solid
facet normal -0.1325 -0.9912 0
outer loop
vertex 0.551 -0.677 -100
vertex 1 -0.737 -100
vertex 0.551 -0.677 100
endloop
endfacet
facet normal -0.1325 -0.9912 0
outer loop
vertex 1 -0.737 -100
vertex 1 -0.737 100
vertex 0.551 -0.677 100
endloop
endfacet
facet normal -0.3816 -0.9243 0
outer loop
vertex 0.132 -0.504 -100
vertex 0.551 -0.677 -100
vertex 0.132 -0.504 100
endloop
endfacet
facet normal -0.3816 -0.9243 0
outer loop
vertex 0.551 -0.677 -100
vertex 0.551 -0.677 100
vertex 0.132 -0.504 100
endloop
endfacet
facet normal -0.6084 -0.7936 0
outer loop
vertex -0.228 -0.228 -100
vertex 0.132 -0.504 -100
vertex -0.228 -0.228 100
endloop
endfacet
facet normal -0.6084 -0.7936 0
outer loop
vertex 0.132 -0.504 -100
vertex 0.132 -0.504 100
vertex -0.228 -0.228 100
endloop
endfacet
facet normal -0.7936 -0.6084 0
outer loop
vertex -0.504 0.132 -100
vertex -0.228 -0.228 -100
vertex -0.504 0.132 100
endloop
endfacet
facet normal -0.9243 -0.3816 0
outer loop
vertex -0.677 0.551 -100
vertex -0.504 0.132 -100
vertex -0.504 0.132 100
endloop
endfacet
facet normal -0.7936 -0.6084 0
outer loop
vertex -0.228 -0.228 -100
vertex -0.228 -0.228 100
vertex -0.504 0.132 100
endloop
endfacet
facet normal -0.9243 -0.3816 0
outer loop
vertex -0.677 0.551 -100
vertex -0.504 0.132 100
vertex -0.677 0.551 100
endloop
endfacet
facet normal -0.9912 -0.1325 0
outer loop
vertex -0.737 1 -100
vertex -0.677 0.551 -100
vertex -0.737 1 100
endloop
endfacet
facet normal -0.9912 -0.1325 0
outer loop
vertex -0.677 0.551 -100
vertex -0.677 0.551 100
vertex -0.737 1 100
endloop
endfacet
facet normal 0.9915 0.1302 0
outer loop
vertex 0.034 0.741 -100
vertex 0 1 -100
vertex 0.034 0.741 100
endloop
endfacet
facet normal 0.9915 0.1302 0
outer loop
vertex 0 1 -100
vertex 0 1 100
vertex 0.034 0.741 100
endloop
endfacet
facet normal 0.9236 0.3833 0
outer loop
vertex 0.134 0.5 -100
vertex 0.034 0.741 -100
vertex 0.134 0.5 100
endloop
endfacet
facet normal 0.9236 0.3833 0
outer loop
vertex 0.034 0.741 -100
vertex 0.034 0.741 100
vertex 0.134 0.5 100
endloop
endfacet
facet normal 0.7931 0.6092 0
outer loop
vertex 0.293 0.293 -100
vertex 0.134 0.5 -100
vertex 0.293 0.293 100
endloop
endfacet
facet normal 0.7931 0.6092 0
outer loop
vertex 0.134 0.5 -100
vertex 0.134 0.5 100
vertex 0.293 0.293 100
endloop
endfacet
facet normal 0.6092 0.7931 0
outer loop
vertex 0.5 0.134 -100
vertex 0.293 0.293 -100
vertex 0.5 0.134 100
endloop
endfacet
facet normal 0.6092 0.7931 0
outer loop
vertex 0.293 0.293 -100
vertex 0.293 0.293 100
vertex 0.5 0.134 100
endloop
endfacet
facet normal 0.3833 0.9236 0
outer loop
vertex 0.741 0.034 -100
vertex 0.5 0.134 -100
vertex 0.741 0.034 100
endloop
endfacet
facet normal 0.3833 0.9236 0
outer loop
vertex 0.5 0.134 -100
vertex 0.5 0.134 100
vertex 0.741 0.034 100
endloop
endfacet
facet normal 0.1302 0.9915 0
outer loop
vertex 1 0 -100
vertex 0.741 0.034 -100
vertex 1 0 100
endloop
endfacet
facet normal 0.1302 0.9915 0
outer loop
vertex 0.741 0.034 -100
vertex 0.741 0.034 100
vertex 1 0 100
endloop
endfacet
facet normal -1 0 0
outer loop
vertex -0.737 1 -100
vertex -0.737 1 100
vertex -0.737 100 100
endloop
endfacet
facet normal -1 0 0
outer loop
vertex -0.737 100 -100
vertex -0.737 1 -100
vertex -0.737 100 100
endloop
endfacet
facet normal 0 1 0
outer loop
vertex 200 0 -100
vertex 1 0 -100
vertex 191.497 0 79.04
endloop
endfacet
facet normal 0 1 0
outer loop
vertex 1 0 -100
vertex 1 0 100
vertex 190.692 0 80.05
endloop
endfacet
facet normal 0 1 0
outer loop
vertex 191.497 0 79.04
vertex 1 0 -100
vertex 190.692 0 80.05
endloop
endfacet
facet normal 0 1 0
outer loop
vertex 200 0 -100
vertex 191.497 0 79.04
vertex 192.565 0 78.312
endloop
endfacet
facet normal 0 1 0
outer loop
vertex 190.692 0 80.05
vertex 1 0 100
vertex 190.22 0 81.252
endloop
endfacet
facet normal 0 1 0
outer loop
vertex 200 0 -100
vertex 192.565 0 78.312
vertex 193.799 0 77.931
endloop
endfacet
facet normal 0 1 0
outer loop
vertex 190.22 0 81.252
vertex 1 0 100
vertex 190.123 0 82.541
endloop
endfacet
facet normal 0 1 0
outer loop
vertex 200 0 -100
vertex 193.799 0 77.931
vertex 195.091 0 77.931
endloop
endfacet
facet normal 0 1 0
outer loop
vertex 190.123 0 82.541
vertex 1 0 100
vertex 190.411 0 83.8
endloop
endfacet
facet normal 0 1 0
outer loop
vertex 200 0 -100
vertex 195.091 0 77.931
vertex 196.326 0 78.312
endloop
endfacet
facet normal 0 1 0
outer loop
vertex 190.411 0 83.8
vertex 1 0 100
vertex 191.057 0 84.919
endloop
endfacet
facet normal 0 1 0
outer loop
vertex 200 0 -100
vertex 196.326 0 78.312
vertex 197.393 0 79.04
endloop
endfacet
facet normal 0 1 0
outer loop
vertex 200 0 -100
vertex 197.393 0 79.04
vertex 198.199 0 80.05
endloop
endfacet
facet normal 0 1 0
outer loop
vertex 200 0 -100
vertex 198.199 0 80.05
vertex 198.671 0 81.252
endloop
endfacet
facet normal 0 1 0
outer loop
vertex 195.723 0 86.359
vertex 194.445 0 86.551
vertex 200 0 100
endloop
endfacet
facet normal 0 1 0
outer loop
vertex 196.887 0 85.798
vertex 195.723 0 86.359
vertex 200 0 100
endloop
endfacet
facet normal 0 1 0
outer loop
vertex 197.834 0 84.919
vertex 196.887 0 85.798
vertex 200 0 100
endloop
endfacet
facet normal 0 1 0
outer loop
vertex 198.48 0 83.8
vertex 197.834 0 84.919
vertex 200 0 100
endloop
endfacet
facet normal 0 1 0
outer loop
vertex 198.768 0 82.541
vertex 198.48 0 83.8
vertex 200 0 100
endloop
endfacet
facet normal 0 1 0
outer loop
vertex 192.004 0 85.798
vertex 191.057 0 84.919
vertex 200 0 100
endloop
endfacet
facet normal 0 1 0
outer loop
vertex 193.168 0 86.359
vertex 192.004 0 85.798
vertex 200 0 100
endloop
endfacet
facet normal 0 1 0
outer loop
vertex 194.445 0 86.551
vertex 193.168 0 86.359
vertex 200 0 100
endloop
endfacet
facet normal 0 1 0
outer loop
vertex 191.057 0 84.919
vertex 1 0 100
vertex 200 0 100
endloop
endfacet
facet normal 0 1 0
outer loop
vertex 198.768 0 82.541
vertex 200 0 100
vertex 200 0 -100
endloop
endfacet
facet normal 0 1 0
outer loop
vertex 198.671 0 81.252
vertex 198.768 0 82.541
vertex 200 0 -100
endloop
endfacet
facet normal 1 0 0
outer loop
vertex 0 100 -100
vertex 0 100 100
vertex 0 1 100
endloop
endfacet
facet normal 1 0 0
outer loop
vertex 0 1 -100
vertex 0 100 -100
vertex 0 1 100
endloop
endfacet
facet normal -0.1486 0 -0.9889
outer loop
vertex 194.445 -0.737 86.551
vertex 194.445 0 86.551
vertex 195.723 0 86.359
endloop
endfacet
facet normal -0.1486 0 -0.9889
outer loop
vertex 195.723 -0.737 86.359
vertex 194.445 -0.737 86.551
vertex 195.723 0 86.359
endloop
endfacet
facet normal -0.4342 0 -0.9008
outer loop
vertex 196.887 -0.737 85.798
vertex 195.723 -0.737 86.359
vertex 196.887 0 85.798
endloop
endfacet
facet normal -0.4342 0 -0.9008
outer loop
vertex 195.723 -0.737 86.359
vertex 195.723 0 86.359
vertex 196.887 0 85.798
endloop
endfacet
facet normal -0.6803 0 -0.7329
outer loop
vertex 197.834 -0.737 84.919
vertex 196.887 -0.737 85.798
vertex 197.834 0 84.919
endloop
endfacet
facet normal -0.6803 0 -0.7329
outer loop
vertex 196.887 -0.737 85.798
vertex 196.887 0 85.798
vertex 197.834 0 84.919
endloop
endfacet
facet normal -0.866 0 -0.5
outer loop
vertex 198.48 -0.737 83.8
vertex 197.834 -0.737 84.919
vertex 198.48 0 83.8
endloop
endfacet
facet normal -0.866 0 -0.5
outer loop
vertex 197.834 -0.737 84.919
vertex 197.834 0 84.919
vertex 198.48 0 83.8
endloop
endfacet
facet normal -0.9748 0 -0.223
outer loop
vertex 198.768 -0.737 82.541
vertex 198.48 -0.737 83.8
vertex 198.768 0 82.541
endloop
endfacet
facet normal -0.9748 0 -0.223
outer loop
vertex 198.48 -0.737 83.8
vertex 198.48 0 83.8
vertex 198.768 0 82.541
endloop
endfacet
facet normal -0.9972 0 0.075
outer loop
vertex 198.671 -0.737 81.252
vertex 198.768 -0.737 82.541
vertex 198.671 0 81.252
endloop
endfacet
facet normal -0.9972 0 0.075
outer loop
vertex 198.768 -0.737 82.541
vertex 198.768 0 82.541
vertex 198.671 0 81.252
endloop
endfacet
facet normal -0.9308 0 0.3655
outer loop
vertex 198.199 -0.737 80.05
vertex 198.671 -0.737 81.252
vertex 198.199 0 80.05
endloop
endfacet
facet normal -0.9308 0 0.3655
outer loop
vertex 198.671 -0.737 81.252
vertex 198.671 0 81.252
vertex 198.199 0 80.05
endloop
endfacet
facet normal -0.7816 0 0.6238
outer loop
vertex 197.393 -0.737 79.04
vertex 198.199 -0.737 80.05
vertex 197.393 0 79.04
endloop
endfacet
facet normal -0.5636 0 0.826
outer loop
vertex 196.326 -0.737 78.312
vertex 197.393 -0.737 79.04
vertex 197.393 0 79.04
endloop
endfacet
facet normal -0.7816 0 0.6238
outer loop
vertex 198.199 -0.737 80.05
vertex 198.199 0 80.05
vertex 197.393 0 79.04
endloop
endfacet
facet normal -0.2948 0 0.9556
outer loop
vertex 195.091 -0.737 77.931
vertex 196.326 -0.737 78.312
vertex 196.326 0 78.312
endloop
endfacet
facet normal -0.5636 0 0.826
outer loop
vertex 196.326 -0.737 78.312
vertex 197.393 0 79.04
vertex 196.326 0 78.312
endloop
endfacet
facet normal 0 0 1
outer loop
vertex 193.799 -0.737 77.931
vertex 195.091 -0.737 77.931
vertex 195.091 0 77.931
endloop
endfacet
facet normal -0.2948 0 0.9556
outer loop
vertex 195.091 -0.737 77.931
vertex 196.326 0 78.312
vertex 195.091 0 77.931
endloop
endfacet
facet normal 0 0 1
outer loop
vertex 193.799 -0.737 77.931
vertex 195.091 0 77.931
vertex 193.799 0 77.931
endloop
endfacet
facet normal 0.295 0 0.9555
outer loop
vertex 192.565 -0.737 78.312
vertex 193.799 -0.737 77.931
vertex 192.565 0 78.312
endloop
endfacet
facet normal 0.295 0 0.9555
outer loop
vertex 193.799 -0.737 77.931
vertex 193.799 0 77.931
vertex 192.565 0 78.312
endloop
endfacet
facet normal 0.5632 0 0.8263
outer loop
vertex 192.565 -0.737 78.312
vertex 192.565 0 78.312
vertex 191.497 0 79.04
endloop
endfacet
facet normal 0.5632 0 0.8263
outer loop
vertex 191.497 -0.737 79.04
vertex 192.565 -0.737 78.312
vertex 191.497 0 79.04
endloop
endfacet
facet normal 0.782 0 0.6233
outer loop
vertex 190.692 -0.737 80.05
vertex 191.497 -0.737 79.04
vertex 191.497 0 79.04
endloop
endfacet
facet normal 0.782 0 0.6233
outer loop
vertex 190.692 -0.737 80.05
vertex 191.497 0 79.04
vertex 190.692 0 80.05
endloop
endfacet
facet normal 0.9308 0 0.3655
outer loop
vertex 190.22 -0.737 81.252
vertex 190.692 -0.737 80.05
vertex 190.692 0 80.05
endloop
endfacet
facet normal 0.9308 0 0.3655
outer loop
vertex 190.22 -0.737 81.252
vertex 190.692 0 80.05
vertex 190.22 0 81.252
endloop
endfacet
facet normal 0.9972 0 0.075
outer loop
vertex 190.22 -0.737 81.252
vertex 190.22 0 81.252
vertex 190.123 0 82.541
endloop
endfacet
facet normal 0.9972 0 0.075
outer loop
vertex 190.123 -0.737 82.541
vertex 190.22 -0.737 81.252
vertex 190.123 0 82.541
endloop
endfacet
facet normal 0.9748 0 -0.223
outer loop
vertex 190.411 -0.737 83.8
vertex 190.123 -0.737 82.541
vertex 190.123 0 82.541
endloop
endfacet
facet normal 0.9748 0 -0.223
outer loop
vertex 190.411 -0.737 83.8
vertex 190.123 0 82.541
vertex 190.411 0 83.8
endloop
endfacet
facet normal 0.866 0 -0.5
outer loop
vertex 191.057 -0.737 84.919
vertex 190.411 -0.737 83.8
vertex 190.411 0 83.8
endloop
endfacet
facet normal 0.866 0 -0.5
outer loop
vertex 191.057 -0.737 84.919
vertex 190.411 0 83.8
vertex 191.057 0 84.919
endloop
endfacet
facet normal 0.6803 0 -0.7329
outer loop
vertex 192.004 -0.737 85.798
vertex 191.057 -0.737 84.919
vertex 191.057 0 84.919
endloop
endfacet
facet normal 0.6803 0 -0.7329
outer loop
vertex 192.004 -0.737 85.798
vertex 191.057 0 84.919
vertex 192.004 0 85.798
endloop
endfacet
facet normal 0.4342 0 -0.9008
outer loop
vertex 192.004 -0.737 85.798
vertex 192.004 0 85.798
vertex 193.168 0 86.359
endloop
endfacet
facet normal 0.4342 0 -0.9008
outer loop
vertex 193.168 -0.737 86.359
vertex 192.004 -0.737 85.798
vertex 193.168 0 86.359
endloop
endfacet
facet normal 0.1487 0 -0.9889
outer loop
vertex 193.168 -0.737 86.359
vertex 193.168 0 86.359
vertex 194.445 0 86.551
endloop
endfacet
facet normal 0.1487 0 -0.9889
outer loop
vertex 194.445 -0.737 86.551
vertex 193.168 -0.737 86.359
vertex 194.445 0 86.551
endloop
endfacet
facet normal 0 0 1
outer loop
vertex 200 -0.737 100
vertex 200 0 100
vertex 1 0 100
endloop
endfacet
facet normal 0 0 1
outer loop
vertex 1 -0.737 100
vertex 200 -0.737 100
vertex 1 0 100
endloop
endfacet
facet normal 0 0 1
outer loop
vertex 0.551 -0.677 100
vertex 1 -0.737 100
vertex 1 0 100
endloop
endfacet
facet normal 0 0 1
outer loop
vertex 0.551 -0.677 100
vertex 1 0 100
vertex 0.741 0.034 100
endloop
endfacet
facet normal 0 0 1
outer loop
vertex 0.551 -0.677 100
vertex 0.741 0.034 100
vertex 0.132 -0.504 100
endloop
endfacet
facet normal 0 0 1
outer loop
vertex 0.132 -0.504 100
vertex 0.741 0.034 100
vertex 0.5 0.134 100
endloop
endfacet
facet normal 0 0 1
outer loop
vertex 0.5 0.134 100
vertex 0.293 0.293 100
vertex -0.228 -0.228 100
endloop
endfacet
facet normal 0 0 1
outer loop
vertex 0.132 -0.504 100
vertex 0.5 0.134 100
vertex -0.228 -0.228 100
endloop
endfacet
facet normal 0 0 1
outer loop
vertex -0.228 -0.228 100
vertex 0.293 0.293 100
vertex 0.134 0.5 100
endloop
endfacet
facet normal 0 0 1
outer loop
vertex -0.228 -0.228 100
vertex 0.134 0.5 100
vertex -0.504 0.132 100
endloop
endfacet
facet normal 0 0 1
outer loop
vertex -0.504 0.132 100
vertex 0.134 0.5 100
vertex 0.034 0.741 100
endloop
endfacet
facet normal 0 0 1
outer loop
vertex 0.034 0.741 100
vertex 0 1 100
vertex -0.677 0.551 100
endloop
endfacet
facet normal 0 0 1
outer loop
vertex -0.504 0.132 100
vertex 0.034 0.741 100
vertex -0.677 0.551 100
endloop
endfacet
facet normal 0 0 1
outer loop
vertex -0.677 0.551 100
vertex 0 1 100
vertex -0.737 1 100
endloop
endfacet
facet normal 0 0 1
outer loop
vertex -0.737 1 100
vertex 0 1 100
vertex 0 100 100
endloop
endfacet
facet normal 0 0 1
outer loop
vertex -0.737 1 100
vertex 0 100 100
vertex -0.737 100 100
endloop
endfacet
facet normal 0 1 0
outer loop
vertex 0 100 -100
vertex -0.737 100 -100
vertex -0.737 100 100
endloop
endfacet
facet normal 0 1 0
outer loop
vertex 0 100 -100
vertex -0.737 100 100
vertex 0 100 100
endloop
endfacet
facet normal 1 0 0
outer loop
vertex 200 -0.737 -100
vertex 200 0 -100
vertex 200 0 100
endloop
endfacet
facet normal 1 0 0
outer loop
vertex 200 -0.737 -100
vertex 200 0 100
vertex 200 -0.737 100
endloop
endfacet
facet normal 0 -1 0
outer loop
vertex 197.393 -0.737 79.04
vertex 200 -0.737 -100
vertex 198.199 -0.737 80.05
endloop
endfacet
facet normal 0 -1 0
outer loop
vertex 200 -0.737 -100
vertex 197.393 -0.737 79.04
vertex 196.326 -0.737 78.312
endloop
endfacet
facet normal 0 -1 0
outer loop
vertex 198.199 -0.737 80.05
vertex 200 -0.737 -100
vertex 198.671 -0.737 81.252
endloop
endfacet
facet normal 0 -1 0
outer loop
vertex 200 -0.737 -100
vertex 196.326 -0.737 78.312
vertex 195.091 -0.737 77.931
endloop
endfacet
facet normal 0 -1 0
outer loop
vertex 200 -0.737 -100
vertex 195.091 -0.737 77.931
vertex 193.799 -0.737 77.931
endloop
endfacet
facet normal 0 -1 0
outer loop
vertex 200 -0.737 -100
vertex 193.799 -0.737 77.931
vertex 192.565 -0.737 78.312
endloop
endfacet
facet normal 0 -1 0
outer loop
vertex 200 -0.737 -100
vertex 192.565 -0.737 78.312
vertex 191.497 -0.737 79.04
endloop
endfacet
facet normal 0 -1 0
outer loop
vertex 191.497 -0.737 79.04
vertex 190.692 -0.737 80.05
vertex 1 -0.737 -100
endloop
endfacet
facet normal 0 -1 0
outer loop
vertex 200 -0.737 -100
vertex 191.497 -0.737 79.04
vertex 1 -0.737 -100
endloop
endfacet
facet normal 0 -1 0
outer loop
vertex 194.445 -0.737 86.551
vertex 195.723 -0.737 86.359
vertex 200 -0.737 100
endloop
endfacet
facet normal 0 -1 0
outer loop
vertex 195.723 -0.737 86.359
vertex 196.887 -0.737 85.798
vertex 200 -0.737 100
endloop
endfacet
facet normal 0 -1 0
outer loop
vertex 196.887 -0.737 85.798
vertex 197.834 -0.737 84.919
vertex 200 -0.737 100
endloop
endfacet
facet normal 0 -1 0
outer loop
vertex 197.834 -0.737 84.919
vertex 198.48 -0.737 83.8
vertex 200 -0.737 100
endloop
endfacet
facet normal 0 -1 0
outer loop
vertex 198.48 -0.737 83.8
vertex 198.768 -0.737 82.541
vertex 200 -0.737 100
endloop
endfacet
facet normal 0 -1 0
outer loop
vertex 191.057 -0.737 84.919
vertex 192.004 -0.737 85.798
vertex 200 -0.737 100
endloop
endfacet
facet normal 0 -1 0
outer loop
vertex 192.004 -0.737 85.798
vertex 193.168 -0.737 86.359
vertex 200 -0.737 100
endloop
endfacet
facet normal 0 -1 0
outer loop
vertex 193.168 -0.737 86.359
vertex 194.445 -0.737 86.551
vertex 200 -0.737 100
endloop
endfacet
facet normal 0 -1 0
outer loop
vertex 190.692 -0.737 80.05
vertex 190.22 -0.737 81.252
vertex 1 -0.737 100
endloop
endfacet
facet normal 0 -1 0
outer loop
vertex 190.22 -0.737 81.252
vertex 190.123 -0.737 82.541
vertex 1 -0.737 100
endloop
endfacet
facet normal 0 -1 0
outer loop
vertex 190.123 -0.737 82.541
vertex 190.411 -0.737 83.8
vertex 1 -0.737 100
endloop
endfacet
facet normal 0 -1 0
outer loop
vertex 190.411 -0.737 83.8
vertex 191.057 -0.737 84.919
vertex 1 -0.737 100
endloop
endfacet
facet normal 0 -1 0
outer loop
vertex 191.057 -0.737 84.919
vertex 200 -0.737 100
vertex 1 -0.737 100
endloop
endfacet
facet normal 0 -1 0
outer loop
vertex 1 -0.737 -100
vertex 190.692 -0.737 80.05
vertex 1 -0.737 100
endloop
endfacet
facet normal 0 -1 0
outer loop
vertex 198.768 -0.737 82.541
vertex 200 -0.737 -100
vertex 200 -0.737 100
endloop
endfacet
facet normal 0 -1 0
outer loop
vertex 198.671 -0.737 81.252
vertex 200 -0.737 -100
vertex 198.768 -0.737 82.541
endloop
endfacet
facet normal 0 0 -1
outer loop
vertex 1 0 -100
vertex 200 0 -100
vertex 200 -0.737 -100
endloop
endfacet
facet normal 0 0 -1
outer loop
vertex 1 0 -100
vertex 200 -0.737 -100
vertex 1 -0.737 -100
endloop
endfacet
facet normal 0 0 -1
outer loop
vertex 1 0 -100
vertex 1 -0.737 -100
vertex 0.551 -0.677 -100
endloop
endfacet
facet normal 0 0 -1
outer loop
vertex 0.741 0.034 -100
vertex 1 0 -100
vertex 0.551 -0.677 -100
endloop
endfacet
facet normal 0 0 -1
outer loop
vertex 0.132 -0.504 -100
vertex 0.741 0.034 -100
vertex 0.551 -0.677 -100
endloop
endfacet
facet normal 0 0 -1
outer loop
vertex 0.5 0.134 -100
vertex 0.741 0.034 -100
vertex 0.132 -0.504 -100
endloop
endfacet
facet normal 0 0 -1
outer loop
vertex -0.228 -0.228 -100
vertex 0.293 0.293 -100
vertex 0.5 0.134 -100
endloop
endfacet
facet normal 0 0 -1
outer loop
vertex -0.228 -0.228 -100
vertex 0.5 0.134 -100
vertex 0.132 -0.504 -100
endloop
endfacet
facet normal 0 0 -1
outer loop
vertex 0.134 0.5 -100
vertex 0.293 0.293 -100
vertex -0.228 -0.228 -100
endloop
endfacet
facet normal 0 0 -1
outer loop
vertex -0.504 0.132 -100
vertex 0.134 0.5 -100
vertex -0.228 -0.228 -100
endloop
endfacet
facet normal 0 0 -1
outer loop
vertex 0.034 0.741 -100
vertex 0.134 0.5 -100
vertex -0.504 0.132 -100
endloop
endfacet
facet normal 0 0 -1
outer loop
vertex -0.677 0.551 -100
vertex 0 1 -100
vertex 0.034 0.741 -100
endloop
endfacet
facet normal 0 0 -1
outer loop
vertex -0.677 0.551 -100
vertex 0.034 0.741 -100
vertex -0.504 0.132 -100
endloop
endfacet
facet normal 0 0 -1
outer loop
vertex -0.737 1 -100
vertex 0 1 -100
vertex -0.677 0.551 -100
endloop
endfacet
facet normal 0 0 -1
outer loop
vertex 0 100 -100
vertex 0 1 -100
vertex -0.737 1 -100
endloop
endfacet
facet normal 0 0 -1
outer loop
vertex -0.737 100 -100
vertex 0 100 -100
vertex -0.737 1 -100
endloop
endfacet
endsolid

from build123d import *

# Parameters (mm, degrees)
BASE_FLANGE1_DEPTH = 100
SKETCH6_R          = 4.334335372
CUT_EXTRUDE1_DEPTH = 10


# Sheet-metal steps are written as plain solids
with BuildPart() as part:
    # Sketch1 → Base-Flange1 (new, symmetric)
    with BuildSketch(Plane.XY):
        with BuildLine():
            Line((0, 100), (0, 1))
            ThreePointArc((0, 1), (0.292893219, 0.292893219), (1, 0))
            Line((1, 0), (200, 0))
            Line((200, 0), (200, -0.7366))
            Line((200, -0.7366), (1, -0.7366))
            ThreePointArc((1, -0.7366), (-0.227961636, -0.227961636), (-0.7366, 1))
            Line((-0.7366, 1), (-0.7366, 100))
            Line((-0.7366, 100), (0, 100))
        make_face()
    extrude(amount=BASE_FLANGE1_DEPTH, both=True)

    # Sketch6 → Cut-Extrude1 (cut)
    with BuildSketch(Plane(origin=(0, 0, 0), x_dir=(1, 0, 0), z_dir=(0, 1, 0))):
        with Locations(Location((194.445286262, -82.216924087, 0), (0, 0, 270))):
            Circle(SKETCH6_R)
    extrude(amount=-CUT_EXTRUDE1_DEPTH, mode=Mode.SUBTRACT)


solid = part.part
